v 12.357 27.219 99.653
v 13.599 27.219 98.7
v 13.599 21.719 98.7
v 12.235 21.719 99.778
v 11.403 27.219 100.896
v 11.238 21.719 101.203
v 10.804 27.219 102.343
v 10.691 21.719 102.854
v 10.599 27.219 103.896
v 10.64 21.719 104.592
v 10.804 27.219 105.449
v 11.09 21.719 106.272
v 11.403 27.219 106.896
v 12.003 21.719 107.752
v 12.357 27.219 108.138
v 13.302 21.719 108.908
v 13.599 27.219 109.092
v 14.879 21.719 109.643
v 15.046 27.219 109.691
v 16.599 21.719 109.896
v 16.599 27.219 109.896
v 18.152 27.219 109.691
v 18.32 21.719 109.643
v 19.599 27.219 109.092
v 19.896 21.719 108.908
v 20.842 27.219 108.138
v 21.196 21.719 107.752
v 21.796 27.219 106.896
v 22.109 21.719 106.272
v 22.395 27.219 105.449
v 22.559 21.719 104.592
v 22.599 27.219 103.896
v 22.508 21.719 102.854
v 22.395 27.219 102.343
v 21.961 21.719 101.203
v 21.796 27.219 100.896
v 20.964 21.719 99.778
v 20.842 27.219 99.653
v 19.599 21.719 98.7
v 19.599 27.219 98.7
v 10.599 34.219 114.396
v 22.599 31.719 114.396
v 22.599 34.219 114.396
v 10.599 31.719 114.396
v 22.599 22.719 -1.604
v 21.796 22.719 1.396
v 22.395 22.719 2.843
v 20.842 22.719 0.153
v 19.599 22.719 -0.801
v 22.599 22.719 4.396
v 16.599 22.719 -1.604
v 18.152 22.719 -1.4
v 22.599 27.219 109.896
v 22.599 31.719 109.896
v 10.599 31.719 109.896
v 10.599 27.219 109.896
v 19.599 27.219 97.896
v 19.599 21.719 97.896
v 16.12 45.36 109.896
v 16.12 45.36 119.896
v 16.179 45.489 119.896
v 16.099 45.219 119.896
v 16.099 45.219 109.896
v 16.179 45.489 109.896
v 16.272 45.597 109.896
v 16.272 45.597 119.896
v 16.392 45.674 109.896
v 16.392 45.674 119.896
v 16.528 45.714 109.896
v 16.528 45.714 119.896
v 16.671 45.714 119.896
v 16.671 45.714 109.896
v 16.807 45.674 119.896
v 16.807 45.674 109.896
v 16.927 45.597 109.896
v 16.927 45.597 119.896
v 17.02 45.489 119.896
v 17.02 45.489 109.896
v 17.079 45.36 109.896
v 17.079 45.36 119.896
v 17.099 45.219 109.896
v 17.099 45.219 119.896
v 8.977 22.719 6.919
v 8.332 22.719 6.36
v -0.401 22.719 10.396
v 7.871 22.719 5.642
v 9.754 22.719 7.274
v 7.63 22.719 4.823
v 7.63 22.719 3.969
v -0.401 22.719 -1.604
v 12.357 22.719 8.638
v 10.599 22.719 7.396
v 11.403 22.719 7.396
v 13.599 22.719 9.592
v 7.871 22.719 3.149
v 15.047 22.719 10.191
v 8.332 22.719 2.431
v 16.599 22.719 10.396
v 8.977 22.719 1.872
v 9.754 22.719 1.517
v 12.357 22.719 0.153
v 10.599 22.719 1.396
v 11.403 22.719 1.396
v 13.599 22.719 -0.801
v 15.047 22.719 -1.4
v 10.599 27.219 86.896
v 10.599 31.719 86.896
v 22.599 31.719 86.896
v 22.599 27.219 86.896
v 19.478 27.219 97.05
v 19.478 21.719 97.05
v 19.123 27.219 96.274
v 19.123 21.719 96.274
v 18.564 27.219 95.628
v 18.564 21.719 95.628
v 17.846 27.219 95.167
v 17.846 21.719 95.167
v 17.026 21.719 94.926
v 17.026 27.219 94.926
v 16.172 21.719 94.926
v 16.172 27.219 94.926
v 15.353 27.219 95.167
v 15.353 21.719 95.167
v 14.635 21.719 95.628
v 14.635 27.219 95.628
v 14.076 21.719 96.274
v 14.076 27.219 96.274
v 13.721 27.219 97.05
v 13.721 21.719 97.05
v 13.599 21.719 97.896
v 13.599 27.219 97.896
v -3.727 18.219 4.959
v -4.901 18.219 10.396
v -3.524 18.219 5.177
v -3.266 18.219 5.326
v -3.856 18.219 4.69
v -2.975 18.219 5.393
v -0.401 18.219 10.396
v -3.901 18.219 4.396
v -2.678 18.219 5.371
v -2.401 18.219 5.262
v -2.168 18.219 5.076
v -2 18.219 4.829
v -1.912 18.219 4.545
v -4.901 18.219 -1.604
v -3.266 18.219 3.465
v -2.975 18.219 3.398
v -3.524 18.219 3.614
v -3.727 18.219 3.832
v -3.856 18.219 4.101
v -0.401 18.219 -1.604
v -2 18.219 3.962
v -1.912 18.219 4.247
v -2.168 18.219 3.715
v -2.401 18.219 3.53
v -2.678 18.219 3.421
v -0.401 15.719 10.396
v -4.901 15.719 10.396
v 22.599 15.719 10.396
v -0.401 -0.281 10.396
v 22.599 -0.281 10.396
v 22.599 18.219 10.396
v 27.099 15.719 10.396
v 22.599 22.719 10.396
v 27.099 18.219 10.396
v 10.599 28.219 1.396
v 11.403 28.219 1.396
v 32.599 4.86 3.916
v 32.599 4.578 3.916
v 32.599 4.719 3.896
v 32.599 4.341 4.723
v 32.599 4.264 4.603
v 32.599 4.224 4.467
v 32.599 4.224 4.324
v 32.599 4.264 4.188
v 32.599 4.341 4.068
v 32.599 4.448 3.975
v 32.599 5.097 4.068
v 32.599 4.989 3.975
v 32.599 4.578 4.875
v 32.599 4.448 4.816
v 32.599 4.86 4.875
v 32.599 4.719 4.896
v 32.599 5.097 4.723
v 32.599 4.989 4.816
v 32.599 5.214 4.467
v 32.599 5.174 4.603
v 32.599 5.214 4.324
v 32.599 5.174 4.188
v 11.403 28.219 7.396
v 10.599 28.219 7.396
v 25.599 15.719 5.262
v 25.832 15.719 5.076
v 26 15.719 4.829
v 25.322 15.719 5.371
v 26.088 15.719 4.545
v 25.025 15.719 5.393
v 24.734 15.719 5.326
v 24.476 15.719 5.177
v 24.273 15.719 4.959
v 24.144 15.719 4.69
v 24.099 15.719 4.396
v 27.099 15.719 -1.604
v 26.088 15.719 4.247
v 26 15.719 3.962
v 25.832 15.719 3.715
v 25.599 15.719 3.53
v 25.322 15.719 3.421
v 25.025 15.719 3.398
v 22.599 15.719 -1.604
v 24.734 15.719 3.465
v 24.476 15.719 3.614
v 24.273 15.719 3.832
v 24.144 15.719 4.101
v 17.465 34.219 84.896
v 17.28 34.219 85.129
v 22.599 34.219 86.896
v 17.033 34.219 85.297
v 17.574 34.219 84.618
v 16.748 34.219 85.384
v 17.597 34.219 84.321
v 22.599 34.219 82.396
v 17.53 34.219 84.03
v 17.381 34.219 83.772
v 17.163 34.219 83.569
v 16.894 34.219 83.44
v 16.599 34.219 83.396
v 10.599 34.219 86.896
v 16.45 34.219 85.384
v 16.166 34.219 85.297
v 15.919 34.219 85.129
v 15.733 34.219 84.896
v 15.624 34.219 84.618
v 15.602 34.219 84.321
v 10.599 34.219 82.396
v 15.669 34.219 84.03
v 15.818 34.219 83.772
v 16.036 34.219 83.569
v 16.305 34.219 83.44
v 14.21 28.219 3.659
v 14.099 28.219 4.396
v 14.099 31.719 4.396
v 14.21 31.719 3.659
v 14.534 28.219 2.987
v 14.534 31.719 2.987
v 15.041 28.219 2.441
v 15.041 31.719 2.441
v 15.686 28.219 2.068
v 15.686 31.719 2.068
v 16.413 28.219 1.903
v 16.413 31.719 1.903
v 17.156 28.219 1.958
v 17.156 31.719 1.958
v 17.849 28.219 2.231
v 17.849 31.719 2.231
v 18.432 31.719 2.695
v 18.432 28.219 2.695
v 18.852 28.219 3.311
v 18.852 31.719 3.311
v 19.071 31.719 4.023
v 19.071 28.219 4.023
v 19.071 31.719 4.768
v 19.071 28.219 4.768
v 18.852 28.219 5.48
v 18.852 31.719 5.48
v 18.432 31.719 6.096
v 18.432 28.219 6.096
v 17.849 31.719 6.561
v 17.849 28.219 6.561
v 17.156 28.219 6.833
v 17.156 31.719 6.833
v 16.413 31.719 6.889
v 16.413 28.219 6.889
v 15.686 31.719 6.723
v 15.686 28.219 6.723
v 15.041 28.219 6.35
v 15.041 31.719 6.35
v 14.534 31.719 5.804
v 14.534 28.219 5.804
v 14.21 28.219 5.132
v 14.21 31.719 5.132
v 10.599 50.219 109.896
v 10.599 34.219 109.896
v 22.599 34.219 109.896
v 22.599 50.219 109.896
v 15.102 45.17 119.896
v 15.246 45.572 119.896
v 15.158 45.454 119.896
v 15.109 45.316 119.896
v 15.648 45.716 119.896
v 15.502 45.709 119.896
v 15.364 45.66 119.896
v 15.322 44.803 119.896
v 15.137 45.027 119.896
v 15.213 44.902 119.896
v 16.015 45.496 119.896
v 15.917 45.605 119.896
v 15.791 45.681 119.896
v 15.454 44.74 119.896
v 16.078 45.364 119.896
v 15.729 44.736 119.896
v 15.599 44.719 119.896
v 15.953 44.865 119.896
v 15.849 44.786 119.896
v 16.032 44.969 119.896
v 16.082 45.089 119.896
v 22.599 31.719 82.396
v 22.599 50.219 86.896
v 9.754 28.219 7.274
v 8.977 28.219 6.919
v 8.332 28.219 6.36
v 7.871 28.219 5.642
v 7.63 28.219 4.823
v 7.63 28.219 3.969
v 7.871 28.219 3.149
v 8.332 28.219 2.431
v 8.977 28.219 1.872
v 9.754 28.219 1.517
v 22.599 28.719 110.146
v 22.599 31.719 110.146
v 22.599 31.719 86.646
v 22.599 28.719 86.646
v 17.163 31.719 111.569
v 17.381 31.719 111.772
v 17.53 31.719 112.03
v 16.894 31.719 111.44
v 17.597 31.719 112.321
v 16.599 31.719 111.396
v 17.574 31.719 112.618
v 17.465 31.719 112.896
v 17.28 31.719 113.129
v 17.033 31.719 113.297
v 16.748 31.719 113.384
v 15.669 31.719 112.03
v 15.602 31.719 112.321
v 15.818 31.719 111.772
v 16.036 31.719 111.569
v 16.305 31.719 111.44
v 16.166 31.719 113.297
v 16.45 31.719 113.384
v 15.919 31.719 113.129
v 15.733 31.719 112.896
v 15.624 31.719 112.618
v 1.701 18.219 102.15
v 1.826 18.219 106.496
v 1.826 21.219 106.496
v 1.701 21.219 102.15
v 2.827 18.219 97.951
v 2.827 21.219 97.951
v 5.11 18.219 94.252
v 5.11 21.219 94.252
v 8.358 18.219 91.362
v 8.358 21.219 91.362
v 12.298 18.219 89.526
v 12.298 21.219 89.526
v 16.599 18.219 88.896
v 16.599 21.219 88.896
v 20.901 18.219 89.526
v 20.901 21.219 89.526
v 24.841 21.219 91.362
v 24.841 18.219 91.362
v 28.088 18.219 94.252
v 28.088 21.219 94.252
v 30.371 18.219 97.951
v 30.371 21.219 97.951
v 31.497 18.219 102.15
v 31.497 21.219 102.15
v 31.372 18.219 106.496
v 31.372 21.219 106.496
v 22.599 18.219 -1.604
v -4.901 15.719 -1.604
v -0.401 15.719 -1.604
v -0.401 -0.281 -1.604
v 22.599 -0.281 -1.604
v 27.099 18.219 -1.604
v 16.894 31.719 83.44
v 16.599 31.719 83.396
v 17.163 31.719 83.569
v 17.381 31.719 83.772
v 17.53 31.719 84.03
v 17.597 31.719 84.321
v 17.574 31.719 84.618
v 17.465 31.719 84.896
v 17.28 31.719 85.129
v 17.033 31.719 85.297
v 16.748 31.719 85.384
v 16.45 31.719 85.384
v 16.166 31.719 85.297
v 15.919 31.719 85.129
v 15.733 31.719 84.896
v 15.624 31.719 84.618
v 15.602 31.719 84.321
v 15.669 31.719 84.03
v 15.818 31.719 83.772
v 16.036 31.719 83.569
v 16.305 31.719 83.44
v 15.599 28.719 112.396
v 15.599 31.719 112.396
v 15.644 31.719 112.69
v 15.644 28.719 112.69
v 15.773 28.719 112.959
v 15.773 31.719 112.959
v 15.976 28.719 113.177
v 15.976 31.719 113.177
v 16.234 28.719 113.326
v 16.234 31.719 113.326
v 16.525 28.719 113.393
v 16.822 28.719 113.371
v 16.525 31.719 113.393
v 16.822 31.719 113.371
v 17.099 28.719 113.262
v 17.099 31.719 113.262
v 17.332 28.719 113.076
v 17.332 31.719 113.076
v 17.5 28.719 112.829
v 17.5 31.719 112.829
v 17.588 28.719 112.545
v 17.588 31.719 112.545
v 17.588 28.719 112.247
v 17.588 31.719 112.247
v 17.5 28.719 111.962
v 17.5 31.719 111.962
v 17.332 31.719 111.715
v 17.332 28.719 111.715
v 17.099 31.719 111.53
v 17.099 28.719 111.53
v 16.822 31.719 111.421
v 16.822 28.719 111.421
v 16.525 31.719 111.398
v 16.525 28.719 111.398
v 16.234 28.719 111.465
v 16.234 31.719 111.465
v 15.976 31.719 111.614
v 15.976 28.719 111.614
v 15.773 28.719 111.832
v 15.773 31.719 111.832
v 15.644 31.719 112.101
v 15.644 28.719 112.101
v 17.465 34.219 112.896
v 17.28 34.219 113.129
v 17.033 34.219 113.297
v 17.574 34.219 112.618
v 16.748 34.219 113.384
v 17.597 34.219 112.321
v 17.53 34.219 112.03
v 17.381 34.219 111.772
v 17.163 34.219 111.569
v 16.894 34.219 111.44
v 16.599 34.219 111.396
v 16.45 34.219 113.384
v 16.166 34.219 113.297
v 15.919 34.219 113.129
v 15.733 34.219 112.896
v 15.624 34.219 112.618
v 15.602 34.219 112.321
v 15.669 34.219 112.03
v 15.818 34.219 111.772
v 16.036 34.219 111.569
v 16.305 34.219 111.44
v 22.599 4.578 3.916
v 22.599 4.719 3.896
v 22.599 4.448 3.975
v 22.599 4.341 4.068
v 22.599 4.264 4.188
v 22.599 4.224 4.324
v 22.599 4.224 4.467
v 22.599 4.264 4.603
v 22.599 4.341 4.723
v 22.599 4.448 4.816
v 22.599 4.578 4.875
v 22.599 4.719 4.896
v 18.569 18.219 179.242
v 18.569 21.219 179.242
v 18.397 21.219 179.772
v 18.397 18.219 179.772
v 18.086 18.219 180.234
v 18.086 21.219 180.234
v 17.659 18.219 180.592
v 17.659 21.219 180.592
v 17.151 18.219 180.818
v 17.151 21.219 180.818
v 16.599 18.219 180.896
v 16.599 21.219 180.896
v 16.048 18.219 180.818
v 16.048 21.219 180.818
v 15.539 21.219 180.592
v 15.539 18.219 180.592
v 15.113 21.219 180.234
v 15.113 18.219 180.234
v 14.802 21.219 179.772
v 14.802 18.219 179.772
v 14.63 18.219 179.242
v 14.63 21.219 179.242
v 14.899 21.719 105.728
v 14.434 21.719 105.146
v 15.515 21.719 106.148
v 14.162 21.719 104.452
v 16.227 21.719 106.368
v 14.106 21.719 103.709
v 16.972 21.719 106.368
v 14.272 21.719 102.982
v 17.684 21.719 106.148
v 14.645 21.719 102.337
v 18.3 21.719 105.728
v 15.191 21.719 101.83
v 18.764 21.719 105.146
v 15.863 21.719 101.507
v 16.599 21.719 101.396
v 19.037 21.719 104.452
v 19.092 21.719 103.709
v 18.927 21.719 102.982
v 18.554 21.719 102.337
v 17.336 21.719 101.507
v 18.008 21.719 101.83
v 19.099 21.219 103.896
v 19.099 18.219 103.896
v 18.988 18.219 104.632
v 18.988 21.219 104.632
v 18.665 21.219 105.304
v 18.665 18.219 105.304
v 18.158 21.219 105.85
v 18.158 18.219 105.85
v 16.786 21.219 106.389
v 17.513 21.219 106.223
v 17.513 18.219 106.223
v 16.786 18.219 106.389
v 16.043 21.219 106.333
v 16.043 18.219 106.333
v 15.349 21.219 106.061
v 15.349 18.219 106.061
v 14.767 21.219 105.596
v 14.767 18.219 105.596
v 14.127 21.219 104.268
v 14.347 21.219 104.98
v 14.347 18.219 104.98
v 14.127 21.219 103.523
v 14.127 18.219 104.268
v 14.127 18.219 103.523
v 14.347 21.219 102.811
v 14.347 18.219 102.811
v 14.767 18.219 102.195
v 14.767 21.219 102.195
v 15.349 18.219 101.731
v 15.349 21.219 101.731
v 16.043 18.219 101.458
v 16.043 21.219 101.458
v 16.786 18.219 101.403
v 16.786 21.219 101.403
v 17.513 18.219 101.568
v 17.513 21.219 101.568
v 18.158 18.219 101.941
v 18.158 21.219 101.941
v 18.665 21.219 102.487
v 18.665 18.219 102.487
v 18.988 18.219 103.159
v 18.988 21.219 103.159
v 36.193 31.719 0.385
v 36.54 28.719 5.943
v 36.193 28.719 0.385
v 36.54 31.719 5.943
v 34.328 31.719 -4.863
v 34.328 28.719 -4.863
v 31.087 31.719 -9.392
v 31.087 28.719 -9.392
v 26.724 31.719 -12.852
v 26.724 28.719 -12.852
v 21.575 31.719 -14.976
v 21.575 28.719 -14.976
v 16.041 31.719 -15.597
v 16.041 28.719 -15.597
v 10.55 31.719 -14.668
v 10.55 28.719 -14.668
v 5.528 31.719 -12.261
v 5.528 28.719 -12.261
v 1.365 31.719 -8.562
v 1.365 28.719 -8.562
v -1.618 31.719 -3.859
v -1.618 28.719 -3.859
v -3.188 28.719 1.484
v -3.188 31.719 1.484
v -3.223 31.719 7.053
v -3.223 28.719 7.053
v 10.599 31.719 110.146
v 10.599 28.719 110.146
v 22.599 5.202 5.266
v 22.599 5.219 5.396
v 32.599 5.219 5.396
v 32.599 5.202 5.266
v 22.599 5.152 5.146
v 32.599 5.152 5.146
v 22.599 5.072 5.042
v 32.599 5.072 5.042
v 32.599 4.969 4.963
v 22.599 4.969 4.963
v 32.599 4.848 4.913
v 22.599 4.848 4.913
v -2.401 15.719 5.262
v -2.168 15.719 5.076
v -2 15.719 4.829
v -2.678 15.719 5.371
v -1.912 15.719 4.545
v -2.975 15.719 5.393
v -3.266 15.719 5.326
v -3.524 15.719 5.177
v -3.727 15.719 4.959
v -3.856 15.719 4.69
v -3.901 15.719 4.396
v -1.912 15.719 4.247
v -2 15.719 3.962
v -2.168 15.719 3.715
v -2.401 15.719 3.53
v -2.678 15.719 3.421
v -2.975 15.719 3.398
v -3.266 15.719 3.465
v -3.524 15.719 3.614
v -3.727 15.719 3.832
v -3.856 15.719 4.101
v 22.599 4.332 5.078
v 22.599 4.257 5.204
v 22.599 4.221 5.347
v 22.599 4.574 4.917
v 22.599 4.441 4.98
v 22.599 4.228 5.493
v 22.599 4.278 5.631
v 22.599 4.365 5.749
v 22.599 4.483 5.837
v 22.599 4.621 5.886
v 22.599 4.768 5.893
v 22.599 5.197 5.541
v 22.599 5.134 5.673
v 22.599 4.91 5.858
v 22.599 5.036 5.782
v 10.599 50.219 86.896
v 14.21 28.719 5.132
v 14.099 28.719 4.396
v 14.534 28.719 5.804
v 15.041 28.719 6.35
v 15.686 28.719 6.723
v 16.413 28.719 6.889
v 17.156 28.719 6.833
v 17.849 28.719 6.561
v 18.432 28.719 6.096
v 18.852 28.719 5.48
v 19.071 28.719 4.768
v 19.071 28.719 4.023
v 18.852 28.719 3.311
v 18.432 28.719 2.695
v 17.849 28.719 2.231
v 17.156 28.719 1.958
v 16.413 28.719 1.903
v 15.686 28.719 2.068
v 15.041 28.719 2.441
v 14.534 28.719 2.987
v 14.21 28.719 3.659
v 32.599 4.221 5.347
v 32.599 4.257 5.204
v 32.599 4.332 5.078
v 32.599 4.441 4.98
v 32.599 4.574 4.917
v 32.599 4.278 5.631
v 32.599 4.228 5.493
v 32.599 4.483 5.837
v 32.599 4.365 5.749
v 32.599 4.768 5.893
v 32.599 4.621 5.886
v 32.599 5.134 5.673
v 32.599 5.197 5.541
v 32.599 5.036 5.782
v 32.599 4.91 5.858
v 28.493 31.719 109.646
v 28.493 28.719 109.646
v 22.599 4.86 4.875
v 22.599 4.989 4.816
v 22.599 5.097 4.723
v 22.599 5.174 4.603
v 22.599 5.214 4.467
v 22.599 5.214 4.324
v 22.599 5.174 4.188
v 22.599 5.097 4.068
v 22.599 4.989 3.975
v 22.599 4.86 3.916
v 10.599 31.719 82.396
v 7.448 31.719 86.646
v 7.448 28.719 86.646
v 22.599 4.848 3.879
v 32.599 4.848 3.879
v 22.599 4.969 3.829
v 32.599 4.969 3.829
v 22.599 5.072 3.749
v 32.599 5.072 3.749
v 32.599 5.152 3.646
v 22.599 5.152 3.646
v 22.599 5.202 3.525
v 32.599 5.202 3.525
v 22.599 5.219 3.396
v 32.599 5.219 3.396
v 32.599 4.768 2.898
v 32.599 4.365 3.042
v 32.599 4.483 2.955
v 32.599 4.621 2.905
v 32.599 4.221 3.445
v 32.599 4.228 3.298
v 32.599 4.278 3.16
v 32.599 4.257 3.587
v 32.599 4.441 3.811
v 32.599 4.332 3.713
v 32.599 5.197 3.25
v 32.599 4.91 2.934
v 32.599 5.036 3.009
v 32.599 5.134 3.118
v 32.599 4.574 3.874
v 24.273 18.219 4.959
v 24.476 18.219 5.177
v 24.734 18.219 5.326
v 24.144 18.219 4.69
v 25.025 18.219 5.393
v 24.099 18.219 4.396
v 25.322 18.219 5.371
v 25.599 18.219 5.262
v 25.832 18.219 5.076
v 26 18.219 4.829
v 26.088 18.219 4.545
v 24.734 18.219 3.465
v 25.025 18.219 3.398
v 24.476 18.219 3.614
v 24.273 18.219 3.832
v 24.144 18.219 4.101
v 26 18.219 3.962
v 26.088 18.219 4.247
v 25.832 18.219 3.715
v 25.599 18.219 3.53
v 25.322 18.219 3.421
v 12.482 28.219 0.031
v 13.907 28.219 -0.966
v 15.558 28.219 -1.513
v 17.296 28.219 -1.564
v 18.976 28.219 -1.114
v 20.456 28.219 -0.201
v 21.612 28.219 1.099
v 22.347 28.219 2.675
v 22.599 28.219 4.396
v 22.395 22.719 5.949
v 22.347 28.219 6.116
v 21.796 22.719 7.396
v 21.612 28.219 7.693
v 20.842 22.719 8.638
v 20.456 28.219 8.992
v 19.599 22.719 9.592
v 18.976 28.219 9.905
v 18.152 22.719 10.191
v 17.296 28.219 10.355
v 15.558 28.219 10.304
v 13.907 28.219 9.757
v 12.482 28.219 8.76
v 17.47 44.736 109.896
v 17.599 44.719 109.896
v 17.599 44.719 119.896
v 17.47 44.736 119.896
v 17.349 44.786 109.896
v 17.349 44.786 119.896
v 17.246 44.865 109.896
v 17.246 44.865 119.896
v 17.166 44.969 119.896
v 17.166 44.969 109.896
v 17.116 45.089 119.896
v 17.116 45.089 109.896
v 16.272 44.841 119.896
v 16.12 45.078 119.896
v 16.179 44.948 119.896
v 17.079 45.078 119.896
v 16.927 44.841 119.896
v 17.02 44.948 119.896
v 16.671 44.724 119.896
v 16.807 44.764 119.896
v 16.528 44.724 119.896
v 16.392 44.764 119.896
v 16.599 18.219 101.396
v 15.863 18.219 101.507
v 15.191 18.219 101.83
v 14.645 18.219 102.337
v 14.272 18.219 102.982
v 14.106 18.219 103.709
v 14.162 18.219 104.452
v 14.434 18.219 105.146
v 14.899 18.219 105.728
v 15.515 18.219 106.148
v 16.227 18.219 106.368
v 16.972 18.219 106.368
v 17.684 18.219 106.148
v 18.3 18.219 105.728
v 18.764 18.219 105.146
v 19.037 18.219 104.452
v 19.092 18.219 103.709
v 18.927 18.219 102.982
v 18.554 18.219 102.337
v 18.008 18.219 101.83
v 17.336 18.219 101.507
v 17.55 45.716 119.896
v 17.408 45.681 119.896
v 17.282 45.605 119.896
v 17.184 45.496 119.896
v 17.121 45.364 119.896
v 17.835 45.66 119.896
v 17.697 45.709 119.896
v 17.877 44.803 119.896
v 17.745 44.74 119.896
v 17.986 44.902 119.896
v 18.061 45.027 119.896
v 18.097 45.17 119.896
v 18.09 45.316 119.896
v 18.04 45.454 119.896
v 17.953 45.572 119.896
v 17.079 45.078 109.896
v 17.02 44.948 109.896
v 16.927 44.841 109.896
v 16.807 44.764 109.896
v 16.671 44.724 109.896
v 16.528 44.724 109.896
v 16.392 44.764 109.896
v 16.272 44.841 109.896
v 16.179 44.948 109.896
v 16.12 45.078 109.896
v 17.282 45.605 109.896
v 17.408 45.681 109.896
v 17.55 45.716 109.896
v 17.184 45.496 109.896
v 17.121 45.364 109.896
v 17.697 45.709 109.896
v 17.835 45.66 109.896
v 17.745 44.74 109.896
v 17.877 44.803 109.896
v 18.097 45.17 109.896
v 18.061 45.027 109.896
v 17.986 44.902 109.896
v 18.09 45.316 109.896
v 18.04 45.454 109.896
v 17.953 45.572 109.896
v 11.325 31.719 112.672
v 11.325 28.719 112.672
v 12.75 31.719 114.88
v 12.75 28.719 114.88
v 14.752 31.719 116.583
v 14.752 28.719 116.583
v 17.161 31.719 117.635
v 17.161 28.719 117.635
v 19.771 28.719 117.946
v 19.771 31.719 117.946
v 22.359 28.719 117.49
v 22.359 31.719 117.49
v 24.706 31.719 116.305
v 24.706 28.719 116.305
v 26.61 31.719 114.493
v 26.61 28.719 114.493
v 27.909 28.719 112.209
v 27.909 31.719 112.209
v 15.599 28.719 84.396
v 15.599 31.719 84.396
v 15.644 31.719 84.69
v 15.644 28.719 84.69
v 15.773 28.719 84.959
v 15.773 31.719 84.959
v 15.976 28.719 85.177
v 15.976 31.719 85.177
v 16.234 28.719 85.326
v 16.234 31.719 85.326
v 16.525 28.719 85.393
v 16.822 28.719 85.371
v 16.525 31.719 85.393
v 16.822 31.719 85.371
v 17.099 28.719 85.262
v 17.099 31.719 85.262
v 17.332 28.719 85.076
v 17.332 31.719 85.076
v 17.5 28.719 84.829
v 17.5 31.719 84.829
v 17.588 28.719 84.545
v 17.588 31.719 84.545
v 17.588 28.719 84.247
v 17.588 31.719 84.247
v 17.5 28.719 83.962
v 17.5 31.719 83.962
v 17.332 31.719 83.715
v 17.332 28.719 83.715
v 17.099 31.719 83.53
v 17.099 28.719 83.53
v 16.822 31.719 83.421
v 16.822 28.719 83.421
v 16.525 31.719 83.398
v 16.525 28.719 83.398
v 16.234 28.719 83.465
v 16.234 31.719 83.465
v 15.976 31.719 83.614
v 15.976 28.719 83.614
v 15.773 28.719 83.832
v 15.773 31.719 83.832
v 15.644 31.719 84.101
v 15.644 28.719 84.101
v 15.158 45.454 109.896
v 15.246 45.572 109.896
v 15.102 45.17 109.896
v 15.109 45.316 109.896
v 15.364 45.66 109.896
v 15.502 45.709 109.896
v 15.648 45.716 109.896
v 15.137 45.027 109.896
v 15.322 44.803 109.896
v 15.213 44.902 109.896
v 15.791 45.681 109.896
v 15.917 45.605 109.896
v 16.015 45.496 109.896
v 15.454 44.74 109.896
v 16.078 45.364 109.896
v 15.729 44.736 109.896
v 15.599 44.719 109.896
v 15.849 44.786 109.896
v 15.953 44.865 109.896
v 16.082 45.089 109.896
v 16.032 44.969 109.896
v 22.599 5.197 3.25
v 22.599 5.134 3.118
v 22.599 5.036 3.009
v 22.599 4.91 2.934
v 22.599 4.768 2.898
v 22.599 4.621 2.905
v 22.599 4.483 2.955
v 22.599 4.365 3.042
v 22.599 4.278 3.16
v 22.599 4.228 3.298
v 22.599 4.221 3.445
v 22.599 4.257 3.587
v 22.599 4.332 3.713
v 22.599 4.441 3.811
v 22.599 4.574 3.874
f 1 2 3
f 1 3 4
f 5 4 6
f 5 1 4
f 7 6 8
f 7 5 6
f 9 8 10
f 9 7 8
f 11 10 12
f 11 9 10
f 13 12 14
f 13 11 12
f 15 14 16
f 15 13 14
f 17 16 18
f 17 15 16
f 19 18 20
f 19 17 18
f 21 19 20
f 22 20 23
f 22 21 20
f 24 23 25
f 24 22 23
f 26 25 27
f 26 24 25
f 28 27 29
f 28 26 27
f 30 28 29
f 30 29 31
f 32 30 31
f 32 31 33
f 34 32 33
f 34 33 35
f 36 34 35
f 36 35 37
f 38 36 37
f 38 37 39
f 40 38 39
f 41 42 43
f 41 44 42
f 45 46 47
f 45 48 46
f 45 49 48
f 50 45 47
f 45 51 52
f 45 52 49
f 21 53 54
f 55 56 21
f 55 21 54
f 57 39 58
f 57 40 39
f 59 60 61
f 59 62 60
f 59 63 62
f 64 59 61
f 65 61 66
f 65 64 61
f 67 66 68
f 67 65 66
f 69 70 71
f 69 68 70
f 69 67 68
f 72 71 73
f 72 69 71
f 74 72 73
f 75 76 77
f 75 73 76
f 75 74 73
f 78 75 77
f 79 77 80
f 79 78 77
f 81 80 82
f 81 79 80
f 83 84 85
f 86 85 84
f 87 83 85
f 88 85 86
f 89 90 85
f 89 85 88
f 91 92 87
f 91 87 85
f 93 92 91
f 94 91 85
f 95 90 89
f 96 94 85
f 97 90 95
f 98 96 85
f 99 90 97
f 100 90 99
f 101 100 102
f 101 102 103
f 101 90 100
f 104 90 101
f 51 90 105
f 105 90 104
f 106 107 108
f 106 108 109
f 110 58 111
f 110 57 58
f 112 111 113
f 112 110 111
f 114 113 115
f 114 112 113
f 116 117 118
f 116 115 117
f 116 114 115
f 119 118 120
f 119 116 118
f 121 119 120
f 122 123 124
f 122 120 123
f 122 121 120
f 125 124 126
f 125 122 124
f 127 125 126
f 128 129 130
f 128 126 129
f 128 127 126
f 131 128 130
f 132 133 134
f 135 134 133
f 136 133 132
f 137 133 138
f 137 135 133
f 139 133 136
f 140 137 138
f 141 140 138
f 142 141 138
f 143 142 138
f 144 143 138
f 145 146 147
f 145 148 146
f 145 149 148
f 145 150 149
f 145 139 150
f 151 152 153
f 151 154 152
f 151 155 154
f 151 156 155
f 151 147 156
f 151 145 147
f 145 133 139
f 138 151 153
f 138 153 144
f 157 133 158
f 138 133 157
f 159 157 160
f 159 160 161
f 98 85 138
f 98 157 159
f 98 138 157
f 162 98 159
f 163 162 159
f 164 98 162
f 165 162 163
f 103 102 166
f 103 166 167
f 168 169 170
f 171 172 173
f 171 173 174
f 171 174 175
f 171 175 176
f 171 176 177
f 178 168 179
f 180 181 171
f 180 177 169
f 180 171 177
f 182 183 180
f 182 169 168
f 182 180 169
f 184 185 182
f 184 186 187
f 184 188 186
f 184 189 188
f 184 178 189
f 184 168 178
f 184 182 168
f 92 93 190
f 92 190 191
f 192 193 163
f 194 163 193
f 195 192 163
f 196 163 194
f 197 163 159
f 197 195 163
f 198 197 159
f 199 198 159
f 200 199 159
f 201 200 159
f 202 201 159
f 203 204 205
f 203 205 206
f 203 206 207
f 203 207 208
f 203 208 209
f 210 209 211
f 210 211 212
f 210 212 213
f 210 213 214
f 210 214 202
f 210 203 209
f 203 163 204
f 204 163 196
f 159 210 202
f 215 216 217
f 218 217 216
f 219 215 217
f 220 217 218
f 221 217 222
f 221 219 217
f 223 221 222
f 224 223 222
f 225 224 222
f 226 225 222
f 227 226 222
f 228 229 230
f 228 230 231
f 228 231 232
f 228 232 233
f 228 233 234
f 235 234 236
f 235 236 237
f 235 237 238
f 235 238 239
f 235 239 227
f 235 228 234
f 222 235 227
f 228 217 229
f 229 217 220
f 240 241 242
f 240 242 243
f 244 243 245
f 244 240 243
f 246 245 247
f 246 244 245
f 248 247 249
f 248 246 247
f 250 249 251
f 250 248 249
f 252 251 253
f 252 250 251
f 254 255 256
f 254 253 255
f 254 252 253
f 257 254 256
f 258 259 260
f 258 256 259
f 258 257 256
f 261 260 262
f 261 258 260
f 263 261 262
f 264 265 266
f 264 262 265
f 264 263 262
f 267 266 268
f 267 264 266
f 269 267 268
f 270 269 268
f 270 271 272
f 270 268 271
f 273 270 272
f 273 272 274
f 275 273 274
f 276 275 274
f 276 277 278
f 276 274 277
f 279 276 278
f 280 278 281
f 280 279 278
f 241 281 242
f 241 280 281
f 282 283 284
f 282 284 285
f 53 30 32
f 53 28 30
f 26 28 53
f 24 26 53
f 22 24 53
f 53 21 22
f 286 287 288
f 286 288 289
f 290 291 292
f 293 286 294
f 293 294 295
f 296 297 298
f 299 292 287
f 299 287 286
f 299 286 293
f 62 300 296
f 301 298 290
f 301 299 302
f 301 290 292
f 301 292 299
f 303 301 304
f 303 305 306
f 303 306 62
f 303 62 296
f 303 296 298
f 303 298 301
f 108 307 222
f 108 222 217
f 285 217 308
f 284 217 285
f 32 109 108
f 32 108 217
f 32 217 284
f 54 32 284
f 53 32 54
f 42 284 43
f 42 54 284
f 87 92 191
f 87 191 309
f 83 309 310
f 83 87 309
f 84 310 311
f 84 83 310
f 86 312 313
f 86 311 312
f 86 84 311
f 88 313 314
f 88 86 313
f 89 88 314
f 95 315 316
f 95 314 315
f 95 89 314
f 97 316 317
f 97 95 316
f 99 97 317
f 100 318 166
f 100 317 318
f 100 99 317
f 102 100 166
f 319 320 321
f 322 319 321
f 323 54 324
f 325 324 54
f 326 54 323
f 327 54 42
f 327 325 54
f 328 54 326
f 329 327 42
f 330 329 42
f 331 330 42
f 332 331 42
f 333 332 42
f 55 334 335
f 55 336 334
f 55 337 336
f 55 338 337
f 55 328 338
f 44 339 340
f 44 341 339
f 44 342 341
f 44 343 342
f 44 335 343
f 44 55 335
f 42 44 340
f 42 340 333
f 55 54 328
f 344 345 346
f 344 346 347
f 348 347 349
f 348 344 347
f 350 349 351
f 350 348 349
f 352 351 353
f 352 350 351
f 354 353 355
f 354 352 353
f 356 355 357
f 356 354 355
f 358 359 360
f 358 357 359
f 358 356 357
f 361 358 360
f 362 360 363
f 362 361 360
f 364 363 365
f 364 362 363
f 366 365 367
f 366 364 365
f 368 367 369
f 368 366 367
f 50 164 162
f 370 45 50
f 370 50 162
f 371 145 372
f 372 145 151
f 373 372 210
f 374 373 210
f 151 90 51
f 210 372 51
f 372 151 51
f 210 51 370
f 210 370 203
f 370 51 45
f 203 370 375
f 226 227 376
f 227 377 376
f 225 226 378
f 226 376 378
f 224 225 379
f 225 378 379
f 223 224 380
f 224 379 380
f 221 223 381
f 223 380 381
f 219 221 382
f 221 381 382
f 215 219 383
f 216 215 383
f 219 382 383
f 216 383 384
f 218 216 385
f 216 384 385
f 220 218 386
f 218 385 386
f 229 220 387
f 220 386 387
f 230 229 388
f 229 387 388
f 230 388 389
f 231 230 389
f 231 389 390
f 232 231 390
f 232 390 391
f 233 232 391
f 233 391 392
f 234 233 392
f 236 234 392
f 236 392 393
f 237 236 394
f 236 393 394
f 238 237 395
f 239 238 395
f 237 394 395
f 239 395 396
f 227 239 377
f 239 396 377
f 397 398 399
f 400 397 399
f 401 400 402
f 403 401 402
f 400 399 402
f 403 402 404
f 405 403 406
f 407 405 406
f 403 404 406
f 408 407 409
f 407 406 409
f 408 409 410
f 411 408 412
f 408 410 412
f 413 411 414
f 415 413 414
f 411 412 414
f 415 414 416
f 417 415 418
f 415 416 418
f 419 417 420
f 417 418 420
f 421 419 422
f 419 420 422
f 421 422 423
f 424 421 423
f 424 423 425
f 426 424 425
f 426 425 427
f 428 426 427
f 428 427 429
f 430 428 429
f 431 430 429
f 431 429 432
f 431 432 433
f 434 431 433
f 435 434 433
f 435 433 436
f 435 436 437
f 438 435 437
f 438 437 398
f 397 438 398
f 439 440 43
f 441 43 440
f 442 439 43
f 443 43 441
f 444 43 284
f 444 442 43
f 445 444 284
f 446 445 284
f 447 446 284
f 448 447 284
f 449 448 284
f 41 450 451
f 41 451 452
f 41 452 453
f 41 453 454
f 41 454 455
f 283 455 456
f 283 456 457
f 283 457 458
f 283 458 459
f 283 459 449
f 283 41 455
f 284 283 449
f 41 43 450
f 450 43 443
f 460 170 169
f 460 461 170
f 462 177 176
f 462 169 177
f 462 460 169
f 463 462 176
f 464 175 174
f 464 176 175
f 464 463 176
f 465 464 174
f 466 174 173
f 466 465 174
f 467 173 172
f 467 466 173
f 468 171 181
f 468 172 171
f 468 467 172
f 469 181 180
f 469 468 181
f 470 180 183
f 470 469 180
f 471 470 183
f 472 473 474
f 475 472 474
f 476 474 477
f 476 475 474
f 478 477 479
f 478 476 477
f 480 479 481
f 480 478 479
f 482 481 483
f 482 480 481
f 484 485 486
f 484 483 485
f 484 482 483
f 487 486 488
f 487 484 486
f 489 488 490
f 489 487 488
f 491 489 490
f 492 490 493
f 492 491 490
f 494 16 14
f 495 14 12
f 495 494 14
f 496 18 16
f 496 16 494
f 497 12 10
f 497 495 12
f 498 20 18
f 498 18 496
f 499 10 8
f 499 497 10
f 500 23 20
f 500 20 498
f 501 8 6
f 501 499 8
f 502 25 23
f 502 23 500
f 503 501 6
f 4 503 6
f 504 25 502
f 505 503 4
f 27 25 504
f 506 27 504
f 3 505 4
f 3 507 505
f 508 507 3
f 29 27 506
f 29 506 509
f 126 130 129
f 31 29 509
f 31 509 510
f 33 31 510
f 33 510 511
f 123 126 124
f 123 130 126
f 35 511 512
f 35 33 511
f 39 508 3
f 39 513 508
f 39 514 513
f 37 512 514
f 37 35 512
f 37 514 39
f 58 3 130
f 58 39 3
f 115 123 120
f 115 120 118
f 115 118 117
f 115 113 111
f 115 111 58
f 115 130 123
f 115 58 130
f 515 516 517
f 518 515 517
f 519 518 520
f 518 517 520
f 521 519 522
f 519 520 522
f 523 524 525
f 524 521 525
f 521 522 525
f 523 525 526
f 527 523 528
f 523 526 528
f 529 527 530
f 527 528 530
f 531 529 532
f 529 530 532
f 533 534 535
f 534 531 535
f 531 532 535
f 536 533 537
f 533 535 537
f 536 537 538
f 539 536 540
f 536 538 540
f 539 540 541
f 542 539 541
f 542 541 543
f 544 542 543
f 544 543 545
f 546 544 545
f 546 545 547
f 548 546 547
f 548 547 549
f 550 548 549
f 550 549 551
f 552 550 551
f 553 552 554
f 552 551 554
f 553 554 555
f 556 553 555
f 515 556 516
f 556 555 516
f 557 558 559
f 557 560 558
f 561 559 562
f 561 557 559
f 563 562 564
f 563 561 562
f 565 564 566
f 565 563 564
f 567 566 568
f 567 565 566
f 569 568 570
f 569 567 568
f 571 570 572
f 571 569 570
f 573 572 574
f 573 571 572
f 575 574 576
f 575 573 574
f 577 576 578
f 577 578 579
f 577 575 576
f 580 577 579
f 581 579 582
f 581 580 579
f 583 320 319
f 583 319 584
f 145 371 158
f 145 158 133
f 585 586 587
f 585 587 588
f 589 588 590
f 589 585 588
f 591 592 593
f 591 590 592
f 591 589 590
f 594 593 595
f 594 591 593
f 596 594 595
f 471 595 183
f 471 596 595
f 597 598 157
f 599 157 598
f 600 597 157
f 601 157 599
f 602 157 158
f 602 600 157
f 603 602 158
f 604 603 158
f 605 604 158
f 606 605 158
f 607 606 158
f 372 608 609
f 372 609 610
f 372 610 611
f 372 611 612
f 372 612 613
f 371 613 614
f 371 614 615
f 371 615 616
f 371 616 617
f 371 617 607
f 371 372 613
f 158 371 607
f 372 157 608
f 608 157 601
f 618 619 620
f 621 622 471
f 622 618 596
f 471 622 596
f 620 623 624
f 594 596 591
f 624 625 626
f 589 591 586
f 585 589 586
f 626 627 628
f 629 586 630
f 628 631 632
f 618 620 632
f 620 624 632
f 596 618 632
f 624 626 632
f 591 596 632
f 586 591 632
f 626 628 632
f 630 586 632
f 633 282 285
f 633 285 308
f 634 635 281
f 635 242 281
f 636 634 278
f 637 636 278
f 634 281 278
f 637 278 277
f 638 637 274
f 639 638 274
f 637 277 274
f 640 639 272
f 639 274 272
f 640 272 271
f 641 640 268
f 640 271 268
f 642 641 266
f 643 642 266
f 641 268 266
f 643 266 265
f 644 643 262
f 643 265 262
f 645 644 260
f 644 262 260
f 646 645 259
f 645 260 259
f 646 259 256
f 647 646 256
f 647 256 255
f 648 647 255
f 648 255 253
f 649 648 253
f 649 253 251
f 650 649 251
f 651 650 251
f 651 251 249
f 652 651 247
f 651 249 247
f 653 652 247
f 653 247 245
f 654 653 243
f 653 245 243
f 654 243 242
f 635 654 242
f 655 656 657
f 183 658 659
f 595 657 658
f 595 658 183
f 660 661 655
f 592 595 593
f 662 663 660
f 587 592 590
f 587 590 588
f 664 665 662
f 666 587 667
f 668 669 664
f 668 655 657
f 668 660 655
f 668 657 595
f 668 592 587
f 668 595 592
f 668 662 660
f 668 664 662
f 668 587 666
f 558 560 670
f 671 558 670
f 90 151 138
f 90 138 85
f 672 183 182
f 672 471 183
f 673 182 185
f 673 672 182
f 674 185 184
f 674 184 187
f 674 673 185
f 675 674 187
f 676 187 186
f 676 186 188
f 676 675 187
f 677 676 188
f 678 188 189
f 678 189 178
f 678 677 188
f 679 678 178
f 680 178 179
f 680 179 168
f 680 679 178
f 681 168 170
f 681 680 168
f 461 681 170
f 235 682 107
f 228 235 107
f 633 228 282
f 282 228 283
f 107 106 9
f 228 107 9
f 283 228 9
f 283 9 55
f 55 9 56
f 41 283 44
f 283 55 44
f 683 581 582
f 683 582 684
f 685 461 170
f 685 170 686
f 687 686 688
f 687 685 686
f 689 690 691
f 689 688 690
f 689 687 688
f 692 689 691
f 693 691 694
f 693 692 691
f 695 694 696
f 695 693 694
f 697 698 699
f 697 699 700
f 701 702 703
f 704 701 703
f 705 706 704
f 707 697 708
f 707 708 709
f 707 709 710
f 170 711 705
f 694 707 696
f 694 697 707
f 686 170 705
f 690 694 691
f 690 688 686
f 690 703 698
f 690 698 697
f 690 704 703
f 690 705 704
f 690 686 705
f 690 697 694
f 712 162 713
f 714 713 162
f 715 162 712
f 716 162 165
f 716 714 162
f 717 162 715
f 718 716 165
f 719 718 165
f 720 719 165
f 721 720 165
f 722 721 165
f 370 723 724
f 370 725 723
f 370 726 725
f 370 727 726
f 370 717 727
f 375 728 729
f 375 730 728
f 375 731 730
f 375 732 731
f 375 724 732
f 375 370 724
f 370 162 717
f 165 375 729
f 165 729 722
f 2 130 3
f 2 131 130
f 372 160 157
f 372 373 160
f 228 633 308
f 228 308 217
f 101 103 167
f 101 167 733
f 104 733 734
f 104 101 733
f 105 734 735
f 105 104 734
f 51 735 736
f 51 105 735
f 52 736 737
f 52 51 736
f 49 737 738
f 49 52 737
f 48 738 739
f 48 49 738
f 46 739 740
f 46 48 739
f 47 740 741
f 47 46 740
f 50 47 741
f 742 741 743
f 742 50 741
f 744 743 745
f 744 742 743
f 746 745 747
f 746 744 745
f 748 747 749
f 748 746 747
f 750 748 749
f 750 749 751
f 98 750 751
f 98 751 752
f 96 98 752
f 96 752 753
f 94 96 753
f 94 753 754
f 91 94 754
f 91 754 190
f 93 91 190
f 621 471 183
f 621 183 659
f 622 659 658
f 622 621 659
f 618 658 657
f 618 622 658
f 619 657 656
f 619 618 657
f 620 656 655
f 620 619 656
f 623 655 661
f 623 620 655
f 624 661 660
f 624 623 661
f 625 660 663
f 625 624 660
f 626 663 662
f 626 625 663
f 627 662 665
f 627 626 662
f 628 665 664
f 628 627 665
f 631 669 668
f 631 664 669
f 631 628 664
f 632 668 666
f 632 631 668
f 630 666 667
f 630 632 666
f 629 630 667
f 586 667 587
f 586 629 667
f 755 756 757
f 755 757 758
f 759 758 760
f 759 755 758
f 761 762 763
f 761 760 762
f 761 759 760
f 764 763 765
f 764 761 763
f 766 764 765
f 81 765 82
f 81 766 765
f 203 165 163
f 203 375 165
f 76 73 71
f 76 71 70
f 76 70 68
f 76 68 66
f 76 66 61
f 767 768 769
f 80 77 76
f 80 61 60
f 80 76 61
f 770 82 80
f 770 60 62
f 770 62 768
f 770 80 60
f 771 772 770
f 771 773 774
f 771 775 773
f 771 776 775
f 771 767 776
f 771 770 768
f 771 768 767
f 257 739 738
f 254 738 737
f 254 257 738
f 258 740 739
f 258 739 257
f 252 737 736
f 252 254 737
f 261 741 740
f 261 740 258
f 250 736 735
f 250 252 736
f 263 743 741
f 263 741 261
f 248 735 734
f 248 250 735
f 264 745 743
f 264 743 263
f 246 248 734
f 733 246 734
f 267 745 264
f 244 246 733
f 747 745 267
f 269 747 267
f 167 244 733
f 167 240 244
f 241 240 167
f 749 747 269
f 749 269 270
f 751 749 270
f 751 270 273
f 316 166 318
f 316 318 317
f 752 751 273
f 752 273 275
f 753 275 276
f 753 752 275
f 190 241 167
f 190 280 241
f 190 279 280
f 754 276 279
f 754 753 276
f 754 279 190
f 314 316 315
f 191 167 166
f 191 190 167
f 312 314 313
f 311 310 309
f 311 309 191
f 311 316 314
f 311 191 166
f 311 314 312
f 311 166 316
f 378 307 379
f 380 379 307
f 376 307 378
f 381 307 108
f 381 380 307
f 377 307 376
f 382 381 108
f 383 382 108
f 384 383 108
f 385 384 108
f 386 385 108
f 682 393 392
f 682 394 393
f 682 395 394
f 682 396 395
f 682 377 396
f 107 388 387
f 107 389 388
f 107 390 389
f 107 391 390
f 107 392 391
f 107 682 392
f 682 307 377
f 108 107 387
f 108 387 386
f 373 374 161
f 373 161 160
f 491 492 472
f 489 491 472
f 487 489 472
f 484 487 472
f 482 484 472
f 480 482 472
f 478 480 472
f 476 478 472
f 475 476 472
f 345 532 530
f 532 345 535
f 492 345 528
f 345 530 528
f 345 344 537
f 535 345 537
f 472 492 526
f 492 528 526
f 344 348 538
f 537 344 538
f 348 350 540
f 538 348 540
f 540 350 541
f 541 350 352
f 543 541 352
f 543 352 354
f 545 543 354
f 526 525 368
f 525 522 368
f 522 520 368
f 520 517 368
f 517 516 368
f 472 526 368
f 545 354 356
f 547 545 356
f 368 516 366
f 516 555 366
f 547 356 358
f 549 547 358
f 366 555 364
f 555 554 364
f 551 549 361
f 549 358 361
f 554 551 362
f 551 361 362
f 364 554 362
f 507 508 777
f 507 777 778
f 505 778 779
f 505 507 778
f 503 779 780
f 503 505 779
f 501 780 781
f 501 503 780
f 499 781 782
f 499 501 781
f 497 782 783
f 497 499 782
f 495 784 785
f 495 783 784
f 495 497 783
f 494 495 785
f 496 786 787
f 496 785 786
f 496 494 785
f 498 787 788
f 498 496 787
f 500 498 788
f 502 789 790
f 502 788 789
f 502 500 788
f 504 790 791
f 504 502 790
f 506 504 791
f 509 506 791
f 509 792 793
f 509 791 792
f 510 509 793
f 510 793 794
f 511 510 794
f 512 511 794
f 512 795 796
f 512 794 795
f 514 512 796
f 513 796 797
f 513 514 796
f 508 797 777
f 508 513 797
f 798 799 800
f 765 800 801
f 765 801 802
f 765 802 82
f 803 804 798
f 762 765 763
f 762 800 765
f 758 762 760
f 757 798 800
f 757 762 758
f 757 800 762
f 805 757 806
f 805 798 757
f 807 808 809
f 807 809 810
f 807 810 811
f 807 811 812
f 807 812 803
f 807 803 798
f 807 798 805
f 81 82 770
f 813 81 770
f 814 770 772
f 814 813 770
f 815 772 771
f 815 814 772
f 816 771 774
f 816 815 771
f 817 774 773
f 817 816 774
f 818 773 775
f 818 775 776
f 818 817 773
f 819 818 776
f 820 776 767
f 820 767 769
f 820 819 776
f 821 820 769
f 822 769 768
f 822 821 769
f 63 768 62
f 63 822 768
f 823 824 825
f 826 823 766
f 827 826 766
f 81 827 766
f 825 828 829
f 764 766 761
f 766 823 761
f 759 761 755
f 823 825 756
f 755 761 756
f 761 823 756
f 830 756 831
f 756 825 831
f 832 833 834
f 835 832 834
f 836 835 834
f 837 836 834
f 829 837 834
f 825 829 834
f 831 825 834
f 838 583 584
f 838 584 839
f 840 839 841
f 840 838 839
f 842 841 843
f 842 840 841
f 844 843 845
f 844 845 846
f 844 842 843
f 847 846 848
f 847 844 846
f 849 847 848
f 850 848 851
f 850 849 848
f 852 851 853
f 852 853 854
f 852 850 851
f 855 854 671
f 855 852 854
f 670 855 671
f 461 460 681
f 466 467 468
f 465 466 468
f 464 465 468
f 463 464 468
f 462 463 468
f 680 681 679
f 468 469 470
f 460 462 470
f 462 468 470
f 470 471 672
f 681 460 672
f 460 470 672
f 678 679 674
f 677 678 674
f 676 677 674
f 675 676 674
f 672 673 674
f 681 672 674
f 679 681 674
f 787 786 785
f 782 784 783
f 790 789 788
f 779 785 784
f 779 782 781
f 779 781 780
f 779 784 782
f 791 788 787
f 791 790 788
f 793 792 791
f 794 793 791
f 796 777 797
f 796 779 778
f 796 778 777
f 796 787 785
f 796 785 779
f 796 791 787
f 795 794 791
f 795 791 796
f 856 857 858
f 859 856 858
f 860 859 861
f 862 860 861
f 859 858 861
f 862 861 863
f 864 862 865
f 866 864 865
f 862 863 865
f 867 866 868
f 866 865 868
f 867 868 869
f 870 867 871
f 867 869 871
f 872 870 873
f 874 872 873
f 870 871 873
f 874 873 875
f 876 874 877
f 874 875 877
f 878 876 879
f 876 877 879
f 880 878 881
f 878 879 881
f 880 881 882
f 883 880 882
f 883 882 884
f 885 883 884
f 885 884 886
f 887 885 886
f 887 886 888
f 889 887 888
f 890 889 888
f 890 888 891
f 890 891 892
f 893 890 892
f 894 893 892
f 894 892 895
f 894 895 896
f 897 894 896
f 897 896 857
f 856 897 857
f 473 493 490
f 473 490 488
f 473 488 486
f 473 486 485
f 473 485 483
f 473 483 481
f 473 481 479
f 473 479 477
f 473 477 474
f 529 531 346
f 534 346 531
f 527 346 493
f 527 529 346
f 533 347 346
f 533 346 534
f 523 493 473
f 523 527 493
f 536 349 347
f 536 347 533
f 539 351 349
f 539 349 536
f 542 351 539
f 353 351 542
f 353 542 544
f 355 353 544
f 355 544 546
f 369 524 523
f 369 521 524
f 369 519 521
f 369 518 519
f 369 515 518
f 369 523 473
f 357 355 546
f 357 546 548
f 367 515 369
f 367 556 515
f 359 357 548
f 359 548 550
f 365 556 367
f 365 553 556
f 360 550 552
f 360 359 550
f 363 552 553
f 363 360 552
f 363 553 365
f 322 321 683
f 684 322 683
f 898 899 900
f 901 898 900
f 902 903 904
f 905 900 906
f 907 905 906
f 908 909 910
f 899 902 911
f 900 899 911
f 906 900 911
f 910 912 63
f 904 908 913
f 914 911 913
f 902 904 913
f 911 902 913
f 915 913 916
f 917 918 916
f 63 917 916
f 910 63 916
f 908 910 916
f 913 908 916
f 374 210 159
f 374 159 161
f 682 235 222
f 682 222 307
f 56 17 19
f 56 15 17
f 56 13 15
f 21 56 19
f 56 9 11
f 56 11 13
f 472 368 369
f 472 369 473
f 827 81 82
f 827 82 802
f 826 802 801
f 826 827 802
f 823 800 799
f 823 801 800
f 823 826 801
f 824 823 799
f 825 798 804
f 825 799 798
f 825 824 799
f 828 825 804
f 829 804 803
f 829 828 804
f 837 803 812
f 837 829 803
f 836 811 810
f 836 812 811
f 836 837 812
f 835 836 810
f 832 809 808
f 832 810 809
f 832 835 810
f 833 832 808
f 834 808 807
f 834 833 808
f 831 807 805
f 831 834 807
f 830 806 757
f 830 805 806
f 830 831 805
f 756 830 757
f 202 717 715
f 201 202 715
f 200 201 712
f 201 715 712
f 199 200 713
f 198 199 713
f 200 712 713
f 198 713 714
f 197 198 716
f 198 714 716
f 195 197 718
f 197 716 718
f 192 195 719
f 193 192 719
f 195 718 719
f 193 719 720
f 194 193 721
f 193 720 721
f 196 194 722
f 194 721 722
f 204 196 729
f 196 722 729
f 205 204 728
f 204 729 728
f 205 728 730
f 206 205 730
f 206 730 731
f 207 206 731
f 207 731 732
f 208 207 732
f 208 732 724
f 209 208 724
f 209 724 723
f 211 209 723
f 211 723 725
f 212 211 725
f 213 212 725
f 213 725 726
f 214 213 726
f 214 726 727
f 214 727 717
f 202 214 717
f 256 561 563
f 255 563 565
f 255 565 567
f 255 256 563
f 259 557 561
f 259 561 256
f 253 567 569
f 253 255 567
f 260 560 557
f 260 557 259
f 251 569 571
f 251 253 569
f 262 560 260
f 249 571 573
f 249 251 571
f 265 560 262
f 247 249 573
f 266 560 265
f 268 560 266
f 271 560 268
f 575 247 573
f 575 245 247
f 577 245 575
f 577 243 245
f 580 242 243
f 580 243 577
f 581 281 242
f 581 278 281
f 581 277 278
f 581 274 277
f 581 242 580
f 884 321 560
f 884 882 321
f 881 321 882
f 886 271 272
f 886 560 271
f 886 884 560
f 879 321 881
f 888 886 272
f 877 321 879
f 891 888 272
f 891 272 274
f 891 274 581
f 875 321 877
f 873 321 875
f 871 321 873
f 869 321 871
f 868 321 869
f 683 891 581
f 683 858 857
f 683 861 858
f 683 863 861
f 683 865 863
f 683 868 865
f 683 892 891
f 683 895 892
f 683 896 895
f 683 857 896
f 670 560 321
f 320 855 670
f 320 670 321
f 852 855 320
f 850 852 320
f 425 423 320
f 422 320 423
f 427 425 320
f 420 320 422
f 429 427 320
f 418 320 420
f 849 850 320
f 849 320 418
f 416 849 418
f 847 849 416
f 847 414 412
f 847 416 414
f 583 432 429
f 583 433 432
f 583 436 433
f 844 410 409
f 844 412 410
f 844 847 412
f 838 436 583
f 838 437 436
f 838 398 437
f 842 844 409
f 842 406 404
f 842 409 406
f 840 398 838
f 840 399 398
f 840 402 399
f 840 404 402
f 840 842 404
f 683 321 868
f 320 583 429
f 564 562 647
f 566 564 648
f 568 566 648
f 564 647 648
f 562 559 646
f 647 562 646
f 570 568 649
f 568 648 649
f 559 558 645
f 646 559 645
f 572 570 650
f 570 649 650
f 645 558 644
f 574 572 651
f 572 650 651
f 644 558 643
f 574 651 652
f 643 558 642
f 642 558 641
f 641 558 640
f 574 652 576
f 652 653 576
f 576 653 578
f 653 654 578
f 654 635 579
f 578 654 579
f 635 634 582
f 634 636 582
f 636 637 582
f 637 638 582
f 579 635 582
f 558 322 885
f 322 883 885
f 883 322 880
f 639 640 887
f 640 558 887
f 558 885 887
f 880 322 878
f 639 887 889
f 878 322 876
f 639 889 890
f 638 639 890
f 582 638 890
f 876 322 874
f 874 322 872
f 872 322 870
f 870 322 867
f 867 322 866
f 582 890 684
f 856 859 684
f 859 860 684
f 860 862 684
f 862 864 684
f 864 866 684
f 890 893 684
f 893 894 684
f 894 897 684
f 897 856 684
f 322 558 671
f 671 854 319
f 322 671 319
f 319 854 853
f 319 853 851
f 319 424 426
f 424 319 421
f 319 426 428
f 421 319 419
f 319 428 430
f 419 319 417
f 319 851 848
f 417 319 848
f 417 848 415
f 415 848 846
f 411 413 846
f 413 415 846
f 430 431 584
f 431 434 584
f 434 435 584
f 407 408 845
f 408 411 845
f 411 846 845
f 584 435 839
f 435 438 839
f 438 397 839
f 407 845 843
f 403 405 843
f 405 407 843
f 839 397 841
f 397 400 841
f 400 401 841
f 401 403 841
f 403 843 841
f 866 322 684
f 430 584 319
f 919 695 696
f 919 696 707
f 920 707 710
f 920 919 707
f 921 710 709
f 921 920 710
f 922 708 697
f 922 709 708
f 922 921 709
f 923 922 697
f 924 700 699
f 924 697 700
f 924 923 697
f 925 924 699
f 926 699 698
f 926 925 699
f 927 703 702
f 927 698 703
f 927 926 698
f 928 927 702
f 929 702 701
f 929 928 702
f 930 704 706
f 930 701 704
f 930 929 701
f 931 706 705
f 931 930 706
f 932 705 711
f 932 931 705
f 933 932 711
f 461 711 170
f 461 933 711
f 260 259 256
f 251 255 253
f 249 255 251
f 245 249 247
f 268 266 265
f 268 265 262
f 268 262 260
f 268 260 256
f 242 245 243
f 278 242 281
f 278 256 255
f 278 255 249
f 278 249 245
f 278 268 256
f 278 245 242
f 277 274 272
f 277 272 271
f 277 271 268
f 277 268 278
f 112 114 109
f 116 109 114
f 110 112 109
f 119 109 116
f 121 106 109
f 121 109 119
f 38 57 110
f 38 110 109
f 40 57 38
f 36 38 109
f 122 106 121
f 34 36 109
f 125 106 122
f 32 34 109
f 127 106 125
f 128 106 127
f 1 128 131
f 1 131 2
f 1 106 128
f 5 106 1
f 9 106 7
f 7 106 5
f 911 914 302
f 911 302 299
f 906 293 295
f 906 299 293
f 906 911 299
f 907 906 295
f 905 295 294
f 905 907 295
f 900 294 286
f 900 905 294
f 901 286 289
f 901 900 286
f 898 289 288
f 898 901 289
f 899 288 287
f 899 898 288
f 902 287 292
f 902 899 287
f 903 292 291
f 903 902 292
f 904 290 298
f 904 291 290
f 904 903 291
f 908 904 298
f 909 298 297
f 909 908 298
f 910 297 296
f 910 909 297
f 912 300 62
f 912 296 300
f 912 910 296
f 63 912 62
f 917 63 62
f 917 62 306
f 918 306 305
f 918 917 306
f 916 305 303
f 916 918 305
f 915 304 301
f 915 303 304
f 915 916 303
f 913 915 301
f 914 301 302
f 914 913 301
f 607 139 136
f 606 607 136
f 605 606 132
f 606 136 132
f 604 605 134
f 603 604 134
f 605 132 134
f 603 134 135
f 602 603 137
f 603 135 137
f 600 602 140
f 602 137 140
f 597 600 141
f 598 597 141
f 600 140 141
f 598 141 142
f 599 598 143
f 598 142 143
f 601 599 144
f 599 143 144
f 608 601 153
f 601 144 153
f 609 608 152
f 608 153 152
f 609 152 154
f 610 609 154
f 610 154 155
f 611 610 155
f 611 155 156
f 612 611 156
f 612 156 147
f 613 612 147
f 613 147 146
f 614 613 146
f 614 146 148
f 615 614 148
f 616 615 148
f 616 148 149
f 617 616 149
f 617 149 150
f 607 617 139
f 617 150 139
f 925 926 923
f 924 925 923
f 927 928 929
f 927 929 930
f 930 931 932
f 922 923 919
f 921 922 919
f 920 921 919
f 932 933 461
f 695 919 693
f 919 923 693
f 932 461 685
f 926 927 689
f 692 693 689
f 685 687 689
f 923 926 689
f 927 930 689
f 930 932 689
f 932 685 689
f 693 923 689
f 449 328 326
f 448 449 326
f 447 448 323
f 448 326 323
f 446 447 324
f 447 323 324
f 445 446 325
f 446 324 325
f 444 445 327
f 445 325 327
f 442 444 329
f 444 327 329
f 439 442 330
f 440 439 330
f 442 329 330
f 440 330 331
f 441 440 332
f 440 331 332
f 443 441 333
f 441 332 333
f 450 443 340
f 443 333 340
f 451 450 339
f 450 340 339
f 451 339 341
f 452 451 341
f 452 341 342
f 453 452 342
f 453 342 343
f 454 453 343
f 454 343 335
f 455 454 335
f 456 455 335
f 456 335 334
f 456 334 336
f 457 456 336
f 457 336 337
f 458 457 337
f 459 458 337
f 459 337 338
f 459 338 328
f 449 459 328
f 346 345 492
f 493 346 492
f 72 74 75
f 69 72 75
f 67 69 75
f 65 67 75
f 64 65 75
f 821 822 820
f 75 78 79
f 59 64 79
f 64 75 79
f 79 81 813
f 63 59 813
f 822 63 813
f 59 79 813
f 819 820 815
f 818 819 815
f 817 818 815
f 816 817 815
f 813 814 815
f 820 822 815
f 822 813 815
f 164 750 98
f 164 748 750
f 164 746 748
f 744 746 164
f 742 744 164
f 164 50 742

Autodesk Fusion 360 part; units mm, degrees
sketch "Sketch1" plane through (0, 0, 0) normal (0, 0, 1) x (1, 0, 0) in component "Servo"
  line L0 (0, 0) -> (0, 16)
  line L1 (0, 16) -> (-4.5, 16)
  line L2 (-4.5, 16) -> (-4.5, 18.5)
  line L3 (-4.5, 18.5) -> (0, 18.5)
  line L4 (0, 18.5) -> (0, 23)
  line L5 (0, 23) -> (23, 23)
  line L6 (23, 23) -> (23, 18.5)
  line L7 (23, 18.5) -> (27.5, 18.5)
  line L8 (27.5, 18.5) -> (27.5, 16)
  line L9 (27.5, 16) -> (23, 16)
  line L10 (23, 16) -> (23, 0)
  line L11 (23, 0) -> (0, 0)
  dimension "d1" = 23
  dimension "d2" = 23
  dimension "d3" = 32
  dimension "d4" = 2.5
  dimension "d5" = 16
extrude "Extrude1" add sketch "Sketch1" along normal blind 12 makes body 1 in component "Servo"
sketch "Sketch2" plane through (-0.1121, 23, -0.0426) normal (0, 1, 0) x (-1, 0, 0) in component "Servo"
  line L0 (-23.1121, 0.0426) -> (-0.1121, 0.0426)
  line L1 (-0.1121, 0.0426) -> (-0.1121, 12.0426)
  line L2 (-0.1121, 12.0426) -> (-23.1121, 12.0426)
  line L3 (-23.1121, 12.0426) -> (-23.1121, 0.0426)
  line L4 (-23.1121, 6.0426) -> (-0.1121, 6.0426)
  arc A0 (-11.916, 9.0426) -> (-11.916, 3.0426) centre (-17.1121, 6.0426) ccw
  arc A1 (-11.916, 3.0426) -> (-11.916, 9.0426) centre (-17.1121, 6.0426) ccw construction
  arc A2 (-11.1121, 3.0426) -> (-11.1121, 9.0426) centre (-11.1121, 6.0426) ccw
  line L5 (-11.916, 9.0426) -> (-11.1121, 9.0426)
  line L6 (-11.1121, 3.0426) -> (-11.916, 3.0426)
  dimension "d8" = 6
  dimension "d9" = 3
extrude "Extrude2" add sketch "Sketch2" along normal blind 5.5 contours L4 A0 A2 L6 | L4 A0 A2 L5 bodies 1 in component "Servo"
sketch "Sketch3" plane through (0, 28.5, 0) normal (0, 1, 0) x (-1, 0, 0) in component "Servo"
  arc A0 (-11.8038, 9) -> (-11.8038, 3) centre (-17, 6) ccw
  line L0 (-11.8038, 3) -> (-11, 3)
  arc A1 (-11, 3) -> (-11, 9) centre (-11, 6) ccw
  line L1 (-11, 9) -> (-11.8038, 9)
  circle A2 centre (-17, 6) radius 2.5
  dimension "d12" = 5
extrude "Extrude3" add sketch "Sketch3" along normal blind 3.5 contours A2 bodies 1 in component "Servo"
sketch "Sketch4" plane through (23, 0, 0) normal (1, 0, 0) x (0, 1, 0) in component "Servo"
  line L0 (0, 0) -> (16, 0)
  line L1 (16, 0) -> (16, 12)
  line L2 (16, 12) -> (0, 12)
  line L3 (0, 12) -> (0, 0)
  line L4 (5, 12) -> (5, 0) construction
  circle A0 centre (5, 6) radius 0.5
  circle A1 centre (5, 7) radius 0.5
  circle A2 centre (5, 5) radius 0.5
  dimension "d15" = 5
  dimension "d16" = 1
extrude "Extrude4" add sketch "Sketch4" along normal blind 10 separate body contours A0 | A2 | A1 makes body 2 at (26.3333, 5.3749, 5.6692) in component "Servo"
sketch "Sketch5" plane through (0, 18.5, 0) normal (0, 1, 0) x (-1, 0, 0) in component "Servo"
  line L0 (-27.5, 0) -> (-23, 0)
  line L1 (-23, 0) -> (-23, 12)
  line L2 (-23, 12) -> (-27.5, 12)
  line L3 (-27.5, 12) -> (-27.5, 0)
  line L4 (-23, 12) -> (0, 12) construction
  line L5 (-11.5, 12) -> (-11.5, 0) construction
  line L6 (0, 0) -> (0, 12)
  line L7 (0, 0) -> (-17, 0)
  line L8 (-25.5, 6) -> (2.5, 6) construction
  circle A0 centre (2.5, 6) radius 1
  circle A1 centre (-25.5, 6) radius 1
  dimension "d19" = 28
  dimension "d20" = 2
extrude "Extrude5" cut sketch "Sketch5" against normal up to surface (2.5 mm away) contours A0 | A1 bodies 1 in component "Servo"
sketch "Sketch1 (2)" plane through (0, 32, 0) normal (0, 1, 0) x (-1, 0, 0) in component "ArmA"
  circle A0 centre (-17, 6) radius 2.5
  arc A1 (-36.9401, 7.5473) -> (2.8226, 8.6578) centre (-17, 6) ccw
  line L0 (-17, 86) -> (-17, 114) construction
  circle A2 centre (-17, 114) radius 1
  circle A3 centre (-17, 86) radius 1
  line L1 (-17, 100) -> (-23, 100) construction
  line L2 (-23, 111.75) -> (-23, 88.25)
  line L3 (-23, 111.75) -> (-11, 111.75)
  line L4 (-23, 88.25) -> (-7.8491, 88.25)
  line L5 (2.8226, 8.6578) -> (-7.8491, 88.25)
  circle A4 centre (-17, 6) radius 2.5
  line L6 (-36.9401, 7.5473) -> (-28.8932, 111.2502)
  line L7 (-7.8491, 88.25) -> (-11, 111.75) construction
  circle A5 centre (-17, 106) radius 2.5 construction
  arc A6 (-11, 111.75) -> (-28.8932, 111.2502) centre (-19.9202, 110.554) ccw
  circle A7 centre (-17, 6) radius 2.5
  dimension "d38" = 20
  dimension "d39" = 2
  dimension "d40" = 6
  dimension "d41" = 5
  dimension "d43" = 12
  dimension "d44" = 23.5
  dimension "d45" = 5
  dimension "d46" = 8
  dimension "d47" = 28
  dimension "d48" = 100
  dimension "d49" = 9
extrude "Extrude1'" add sketch "Sketch1 (2)" against normal blind 3 separate body makes body 3 in component "ArmA"
sketch "Sketch1 (3)" plane through (0, 0, 0) normal (0, 1, 0) x (1, 0, 0) in component "ArmB"
  arc A0 (14.7729, -2.6) -> (-14.7729, -2.6) centre (0, 0) ccw
  circle A1 centre (0, 0) radius 2.5
  line L0 (-14.7729, -2.6) -> (-1.9697, -75.3467)
  line L1 (14.7729, -2.6) -> (1.9697, -75.3467)
  arc A2 (-1.9697, -75.3467) -> (1.9697, -75.3467) centre (0, -75) ccw
  dimension "d60" = 15
  dimension "d61" = 5
  dimension "d62" = 2
  dimension "d63" = 75
extrude "Extrude1''" add sketch "Sketch1 (3)" along normal blind 3 separate body makes body 4 in component "ArmB"
component "Servo" placed x (1, 0, 0) y (0, 1, 0) z (0, 0, 1) at (-0.4006, -0.2813, -1.6044)
component "ArmA" placed x (1, 0, 0) y (0, 1, 0) z (0, 0, 1) at (-0.4006, -0.2813, -1.6044)
component "Servo" placed x (0, 0, 1) y (0, -1, 0) z (1, 0, 0) at (10.5994, 50.2187, 86.8956)
component "ArmB" placed x (1, 0, 0) y (0, 1, 0) z (0, 0, 1) at (16.5994, 18.2187, 103.8956)
